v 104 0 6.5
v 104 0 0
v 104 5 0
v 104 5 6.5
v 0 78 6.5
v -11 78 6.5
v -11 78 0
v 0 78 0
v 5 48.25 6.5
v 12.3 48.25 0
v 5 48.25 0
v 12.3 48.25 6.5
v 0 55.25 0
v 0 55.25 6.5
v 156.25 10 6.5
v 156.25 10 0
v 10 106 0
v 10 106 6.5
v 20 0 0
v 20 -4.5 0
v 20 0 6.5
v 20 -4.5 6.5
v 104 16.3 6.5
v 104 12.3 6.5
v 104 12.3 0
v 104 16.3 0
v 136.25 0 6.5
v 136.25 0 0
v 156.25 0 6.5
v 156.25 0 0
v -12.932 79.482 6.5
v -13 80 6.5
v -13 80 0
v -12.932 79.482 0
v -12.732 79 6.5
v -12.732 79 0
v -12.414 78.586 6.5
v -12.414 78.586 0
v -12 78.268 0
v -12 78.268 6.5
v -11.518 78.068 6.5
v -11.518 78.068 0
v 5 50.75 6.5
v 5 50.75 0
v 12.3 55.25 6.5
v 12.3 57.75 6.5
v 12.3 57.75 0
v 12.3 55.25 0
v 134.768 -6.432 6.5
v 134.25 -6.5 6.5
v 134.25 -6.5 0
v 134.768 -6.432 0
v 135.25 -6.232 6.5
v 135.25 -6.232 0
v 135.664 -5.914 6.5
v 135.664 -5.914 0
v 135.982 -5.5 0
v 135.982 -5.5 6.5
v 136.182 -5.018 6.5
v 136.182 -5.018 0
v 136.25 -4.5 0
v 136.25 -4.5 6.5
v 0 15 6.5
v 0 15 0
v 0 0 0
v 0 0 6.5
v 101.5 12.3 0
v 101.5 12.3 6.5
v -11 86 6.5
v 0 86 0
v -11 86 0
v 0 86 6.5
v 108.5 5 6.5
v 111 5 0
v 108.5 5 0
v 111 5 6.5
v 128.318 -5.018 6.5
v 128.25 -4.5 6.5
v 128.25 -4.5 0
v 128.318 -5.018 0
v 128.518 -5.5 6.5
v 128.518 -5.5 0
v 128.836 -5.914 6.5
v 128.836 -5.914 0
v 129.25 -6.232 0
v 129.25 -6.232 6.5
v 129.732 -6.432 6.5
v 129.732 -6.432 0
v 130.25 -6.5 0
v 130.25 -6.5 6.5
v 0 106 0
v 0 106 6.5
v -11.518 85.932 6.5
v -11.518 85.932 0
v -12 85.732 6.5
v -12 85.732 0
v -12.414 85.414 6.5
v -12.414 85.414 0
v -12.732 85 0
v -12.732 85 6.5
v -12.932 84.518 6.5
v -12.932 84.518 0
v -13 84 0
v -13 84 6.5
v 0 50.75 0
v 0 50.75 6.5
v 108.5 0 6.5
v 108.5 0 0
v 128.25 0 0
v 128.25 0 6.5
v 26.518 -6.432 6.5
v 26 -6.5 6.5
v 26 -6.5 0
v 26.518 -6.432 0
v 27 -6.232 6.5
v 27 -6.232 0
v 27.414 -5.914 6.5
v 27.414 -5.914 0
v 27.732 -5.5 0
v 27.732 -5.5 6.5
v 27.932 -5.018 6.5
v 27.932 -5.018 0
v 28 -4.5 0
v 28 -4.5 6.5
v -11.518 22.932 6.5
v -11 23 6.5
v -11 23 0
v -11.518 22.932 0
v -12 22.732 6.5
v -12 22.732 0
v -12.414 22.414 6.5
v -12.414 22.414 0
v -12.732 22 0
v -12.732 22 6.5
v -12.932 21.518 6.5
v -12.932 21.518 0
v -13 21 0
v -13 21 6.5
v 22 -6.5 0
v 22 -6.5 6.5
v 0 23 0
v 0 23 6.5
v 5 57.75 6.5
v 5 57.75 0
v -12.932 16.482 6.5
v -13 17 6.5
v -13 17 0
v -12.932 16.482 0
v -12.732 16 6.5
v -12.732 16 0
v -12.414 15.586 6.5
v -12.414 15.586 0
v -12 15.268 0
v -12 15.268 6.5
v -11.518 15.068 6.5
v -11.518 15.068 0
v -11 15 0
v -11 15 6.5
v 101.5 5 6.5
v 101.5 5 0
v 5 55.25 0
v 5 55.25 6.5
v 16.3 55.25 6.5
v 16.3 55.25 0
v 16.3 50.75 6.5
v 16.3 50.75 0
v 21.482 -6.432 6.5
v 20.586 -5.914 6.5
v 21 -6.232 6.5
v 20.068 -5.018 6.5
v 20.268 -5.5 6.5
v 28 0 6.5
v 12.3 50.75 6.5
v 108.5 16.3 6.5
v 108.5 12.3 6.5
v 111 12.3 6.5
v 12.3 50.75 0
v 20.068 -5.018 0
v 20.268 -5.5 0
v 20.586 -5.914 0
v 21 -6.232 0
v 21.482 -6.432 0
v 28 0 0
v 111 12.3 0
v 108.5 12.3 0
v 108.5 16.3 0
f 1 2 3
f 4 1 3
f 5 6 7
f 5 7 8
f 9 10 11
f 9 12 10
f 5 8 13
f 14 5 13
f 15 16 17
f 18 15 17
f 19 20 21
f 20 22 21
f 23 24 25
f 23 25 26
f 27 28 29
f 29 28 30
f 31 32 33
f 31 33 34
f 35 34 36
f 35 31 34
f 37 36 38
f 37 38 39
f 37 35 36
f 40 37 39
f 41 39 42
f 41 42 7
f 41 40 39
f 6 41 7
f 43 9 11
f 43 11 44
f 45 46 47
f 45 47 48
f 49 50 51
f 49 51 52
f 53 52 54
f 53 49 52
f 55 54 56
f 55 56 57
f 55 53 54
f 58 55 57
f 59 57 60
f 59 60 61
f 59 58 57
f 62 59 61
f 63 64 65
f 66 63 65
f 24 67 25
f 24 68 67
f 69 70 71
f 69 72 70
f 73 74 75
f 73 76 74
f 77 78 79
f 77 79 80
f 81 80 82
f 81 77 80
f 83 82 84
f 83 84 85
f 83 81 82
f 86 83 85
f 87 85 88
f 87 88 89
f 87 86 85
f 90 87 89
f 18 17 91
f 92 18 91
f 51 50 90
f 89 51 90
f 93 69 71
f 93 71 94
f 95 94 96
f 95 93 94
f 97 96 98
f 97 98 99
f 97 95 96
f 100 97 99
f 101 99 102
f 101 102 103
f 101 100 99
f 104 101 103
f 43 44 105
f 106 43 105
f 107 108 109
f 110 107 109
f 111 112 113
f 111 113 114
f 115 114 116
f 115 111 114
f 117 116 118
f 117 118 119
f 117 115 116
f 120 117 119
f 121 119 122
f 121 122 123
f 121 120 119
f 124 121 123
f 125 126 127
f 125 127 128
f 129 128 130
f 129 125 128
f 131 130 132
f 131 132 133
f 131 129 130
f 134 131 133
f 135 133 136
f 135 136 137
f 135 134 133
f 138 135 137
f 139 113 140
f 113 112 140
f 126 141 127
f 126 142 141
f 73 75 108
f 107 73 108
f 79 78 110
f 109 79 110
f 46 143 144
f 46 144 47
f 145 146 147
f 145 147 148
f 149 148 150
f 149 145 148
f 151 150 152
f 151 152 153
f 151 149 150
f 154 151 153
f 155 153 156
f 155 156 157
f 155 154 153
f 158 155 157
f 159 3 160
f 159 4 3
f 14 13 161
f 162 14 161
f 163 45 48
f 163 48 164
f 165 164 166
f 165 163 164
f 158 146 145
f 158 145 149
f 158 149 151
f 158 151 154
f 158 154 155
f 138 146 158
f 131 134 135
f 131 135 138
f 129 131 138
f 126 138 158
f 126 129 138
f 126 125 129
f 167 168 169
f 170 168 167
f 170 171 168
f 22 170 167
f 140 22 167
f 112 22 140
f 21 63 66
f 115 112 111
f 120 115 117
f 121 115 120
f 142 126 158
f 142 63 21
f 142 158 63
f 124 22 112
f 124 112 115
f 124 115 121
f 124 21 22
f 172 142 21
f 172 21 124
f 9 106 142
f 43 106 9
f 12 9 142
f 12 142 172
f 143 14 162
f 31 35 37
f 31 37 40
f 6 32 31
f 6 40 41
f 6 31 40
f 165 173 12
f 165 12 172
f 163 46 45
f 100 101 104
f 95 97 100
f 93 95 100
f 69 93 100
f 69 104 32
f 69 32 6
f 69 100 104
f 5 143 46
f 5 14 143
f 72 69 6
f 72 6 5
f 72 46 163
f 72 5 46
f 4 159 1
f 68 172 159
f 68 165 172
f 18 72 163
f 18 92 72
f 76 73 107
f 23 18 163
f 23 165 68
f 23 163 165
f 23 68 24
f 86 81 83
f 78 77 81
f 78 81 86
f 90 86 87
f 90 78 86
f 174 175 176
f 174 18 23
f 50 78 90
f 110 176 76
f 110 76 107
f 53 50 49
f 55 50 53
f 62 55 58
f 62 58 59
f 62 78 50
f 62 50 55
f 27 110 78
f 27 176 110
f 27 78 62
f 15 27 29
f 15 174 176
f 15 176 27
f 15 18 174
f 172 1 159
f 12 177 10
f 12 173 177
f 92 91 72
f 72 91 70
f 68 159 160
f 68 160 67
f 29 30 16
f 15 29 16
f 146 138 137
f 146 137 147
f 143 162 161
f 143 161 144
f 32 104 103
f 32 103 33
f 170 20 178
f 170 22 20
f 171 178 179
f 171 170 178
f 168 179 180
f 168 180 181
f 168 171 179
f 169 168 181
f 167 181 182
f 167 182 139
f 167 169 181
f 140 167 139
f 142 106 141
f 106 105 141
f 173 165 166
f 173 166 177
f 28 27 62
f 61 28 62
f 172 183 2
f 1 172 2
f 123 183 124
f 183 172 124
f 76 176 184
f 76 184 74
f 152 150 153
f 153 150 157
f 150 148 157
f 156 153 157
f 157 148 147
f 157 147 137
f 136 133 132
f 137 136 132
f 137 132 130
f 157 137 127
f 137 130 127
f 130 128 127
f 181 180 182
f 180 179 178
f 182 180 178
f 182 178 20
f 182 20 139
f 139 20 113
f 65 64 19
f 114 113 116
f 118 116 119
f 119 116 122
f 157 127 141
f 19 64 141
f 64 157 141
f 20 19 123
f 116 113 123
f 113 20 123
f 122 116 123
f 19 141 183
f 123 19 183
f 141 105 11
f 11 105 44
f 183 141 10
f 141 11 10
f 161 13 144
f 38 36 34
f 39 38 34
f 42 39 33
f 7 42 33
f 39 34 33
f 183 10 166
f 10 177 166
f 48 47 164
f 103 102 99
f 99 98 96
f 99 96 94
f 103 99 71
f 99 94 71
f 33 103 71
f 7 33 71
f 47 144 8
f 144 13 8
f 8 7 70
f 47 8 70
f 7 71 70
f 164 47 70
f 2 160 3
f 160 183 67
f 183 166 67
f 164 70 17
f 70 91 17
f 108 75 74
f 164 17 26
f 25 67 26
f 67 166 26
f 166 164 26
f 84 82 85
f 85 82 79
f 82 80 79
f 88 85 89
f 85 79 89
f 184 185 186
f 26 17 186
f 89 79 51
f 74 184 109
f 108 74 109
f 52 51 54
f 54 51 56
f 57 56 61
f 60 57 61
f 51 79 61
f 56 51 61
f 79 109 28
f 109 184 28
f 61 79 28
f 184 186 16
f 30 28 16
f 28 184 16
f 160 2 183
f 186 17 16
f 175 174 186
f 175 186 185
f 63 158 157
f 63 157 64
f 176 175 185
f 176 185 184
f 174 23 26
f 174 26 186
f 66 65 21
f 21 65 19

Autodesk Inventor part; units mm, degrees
ref_plane "YZ Plane" through (0, 0, 0) normal (1, 0, 0) x (0, 1, 0)
ref_plane "XZ Plane" through (0, 0, 0) normal (0, 1, 0) x (-1, 0, 0)
ref_plane "XY Plane" through (0, 0, 0) normal (0, 0, 1) x (1, 0, 0)
sketch "Sketch1" plane through (0, 0, 0) normal (0, 0, 1) x (1, 0, 0)
  line L0 (0, 106) -> (0, 0)
  line L1 (0, 0) -> (156.25, 0)
  line L2 (156.25, 0) -> (156.25, 10)
  line L3 (156.25, 10) -> (10, 106)
  line L4 (10, 106) -> (0, 106)
  dimension "d0" = 156.25
  dimension "d1" = 106
  dimension "d2" = 10
  dimension "d3" = 10
extrude "Extrusion1" add sketch "Sketch1" along normal blind 6.5
sketch "Sketch2" plane through (0, 0, 6.5) normal (0, 0, 1) x (1, 0, 0)
  line L0 (0, 106) -> (0, 0) projected
  line L1 (0, 0) -> (156.25, 0) projected
  line L2 (156.25, 0) -> (156.25, 10) projected
  line L3 (16.3, 55.25) -> (16.3, 50.75)
  line L4 (0, 50.75) -> (0, 55.25)
  line L5 (5, 57.75) -> (12.3, 57.75)
  line L6 (12.3, 48.25) -> (5, 48.25)
  line L7 (0, 55.25) -> (5, 55.25)
  line L8 (12.3, 55.25) -> (16.3, 55.25)
  line L9 (16.3, 50.75) -> (12.3, 50.75)
  line L10 (5, 50.75) -> (0, 50.75)
  line L11 (5, 48.25) -> (5, 50.75)
  line L12 (5, 55.25) -> (5, 57.75)
  line L13 (12.3, 57.75) -> (12.3, 55.25)
  line L14 (12.3, 50.75) -> (12.3, 48.25)
  line L15 (104, 16.3) -> (108.5, 16.3)
  line L16 (108.5, 0) -> (104, 0)
  line L17 (111, 12.3) -> (111, 5)
  line L18 (101.5, 5) -> (101.5, 12.3)
  line L19 (101.5, 12.3) -> (104, 12.3)
  line L20 (108.5, 12.3) -> (111, 12.3)
  line L21 (111, 5) -> (108.5, 5)
  line L22 (104, 5) -> (101.5, 5)
  line L23 (104, 0) -> (104, 5)
  line L24 (104, 12.3) -> (104, 16.3)
  line L25 (108.5, 16.3) -> (108.5, 12.3)
  line L26 (108.5, 5) -> (108.5, 0)
  point P0 (16.3, 53)
  point P1 (0, 53)
  point P2 (106.25, 16.3)
  dimension "d6" = 4.5
  dimension "d7" = 2.5
  dimension "d8" = 2.5
  dimension "d9" = 5
  dimension "d10" = 7.3
  dimension "d11" = 4
  dimension "d12" = 4.5
  dimension "d13" = 5
  dimension "d14" = 7.3
  dimension "d15" = 4
  dimension "d16" = 2.5
  dimension "d17" = 2.5
  dimension "d18" = 50
extrude "Extrusion2" cut sketch "Sketch2" against normal through all
sketch "Sketch3" plane through (0, 0, 6.5) normal (0, 0, 1) x (1, 0, 0)
  line L0 (0, 50.75) -> (0, 0) projected
  line L1 (0, 0) -> (104, 0) projected
  line L2 (108.5, 0) -> (156.25, 0) projected
  line L3 (10, 106) -> (0, 106) projected
  line L4 (0, 106) -> (0, 55.25) projected
  line L5 (0, 86) -> (-11, 86)
  line L6 (-13, 84) -> (-13, 80)
  line L7 (-11, 78) -> (0, 78)
  line L8 (0, 78) -> (0, 86)
  line L9 (0, 23) -> (-11, 23)
  line L10 (-13, 21) -> (-13, 17)
  line L11 (-11, 15) -> (0, 15)
  line L12 (0, 15) -> (0, 23)
  line L13 (20, 0) -> (28, 0)
  line L14 (28, 0) -> (28, -4.5)
  line L15 (26, -6.5) -> (22, -6.5)
  line L16 (20, -4.5) -> (20, 0)
  line L17 (128.25, 0) -> (136.25, 0)
  line L18 (136.25, 0) -> (136.25, -4.5)
  line L19 (134.25, -6.5) -> (130.25, -6.5)
  line L20 (128.25, -4.5) -> (128.25, 0)
  arc A0 (-11, 86) -> (-13, 84) centre (-11, 84) ccw
  arc A1 (-13, 80) -> (-11, 78) centre (-11, 80) ccw
  arc A2 (-11, 23) -> (-13, 21) centre (-11, 21) ccw
  arc A3 (-13, 17) -> (-11, 15) centre (-11, 17) ccw
  arc A4 (20, -4.5) -> (22, -6.5) centre (22, -4.5) ccw
  arc A5 (26, -6.5) -> (28, -4.5) centre (26, -4.5) ccw
  arc A6 (128.25, -4.5) -> (130.25, -6.5) centre (130.25, -4.5) ccw
  arc A7 (134.25, -6.5) -> (136.25, -4.5) centre (134.25, -4.5) ccw
  dimension "d21" = 2
  dimension "d22" = 8
  dimension "d23" = 8
  dimension "d24" = 8
  dimension "d25" = 8
  dimension "d26" = 13
  dimension "d27" = 6.5
  dimension "d28" = 15
  dimension "d29" = 20
  dimension "d30" = 20
  dimension "d31" = 20
extrude "Extrusion3" add sketch "Sketch3" against normal blind 6.5
properties part number "wiring_brace"
